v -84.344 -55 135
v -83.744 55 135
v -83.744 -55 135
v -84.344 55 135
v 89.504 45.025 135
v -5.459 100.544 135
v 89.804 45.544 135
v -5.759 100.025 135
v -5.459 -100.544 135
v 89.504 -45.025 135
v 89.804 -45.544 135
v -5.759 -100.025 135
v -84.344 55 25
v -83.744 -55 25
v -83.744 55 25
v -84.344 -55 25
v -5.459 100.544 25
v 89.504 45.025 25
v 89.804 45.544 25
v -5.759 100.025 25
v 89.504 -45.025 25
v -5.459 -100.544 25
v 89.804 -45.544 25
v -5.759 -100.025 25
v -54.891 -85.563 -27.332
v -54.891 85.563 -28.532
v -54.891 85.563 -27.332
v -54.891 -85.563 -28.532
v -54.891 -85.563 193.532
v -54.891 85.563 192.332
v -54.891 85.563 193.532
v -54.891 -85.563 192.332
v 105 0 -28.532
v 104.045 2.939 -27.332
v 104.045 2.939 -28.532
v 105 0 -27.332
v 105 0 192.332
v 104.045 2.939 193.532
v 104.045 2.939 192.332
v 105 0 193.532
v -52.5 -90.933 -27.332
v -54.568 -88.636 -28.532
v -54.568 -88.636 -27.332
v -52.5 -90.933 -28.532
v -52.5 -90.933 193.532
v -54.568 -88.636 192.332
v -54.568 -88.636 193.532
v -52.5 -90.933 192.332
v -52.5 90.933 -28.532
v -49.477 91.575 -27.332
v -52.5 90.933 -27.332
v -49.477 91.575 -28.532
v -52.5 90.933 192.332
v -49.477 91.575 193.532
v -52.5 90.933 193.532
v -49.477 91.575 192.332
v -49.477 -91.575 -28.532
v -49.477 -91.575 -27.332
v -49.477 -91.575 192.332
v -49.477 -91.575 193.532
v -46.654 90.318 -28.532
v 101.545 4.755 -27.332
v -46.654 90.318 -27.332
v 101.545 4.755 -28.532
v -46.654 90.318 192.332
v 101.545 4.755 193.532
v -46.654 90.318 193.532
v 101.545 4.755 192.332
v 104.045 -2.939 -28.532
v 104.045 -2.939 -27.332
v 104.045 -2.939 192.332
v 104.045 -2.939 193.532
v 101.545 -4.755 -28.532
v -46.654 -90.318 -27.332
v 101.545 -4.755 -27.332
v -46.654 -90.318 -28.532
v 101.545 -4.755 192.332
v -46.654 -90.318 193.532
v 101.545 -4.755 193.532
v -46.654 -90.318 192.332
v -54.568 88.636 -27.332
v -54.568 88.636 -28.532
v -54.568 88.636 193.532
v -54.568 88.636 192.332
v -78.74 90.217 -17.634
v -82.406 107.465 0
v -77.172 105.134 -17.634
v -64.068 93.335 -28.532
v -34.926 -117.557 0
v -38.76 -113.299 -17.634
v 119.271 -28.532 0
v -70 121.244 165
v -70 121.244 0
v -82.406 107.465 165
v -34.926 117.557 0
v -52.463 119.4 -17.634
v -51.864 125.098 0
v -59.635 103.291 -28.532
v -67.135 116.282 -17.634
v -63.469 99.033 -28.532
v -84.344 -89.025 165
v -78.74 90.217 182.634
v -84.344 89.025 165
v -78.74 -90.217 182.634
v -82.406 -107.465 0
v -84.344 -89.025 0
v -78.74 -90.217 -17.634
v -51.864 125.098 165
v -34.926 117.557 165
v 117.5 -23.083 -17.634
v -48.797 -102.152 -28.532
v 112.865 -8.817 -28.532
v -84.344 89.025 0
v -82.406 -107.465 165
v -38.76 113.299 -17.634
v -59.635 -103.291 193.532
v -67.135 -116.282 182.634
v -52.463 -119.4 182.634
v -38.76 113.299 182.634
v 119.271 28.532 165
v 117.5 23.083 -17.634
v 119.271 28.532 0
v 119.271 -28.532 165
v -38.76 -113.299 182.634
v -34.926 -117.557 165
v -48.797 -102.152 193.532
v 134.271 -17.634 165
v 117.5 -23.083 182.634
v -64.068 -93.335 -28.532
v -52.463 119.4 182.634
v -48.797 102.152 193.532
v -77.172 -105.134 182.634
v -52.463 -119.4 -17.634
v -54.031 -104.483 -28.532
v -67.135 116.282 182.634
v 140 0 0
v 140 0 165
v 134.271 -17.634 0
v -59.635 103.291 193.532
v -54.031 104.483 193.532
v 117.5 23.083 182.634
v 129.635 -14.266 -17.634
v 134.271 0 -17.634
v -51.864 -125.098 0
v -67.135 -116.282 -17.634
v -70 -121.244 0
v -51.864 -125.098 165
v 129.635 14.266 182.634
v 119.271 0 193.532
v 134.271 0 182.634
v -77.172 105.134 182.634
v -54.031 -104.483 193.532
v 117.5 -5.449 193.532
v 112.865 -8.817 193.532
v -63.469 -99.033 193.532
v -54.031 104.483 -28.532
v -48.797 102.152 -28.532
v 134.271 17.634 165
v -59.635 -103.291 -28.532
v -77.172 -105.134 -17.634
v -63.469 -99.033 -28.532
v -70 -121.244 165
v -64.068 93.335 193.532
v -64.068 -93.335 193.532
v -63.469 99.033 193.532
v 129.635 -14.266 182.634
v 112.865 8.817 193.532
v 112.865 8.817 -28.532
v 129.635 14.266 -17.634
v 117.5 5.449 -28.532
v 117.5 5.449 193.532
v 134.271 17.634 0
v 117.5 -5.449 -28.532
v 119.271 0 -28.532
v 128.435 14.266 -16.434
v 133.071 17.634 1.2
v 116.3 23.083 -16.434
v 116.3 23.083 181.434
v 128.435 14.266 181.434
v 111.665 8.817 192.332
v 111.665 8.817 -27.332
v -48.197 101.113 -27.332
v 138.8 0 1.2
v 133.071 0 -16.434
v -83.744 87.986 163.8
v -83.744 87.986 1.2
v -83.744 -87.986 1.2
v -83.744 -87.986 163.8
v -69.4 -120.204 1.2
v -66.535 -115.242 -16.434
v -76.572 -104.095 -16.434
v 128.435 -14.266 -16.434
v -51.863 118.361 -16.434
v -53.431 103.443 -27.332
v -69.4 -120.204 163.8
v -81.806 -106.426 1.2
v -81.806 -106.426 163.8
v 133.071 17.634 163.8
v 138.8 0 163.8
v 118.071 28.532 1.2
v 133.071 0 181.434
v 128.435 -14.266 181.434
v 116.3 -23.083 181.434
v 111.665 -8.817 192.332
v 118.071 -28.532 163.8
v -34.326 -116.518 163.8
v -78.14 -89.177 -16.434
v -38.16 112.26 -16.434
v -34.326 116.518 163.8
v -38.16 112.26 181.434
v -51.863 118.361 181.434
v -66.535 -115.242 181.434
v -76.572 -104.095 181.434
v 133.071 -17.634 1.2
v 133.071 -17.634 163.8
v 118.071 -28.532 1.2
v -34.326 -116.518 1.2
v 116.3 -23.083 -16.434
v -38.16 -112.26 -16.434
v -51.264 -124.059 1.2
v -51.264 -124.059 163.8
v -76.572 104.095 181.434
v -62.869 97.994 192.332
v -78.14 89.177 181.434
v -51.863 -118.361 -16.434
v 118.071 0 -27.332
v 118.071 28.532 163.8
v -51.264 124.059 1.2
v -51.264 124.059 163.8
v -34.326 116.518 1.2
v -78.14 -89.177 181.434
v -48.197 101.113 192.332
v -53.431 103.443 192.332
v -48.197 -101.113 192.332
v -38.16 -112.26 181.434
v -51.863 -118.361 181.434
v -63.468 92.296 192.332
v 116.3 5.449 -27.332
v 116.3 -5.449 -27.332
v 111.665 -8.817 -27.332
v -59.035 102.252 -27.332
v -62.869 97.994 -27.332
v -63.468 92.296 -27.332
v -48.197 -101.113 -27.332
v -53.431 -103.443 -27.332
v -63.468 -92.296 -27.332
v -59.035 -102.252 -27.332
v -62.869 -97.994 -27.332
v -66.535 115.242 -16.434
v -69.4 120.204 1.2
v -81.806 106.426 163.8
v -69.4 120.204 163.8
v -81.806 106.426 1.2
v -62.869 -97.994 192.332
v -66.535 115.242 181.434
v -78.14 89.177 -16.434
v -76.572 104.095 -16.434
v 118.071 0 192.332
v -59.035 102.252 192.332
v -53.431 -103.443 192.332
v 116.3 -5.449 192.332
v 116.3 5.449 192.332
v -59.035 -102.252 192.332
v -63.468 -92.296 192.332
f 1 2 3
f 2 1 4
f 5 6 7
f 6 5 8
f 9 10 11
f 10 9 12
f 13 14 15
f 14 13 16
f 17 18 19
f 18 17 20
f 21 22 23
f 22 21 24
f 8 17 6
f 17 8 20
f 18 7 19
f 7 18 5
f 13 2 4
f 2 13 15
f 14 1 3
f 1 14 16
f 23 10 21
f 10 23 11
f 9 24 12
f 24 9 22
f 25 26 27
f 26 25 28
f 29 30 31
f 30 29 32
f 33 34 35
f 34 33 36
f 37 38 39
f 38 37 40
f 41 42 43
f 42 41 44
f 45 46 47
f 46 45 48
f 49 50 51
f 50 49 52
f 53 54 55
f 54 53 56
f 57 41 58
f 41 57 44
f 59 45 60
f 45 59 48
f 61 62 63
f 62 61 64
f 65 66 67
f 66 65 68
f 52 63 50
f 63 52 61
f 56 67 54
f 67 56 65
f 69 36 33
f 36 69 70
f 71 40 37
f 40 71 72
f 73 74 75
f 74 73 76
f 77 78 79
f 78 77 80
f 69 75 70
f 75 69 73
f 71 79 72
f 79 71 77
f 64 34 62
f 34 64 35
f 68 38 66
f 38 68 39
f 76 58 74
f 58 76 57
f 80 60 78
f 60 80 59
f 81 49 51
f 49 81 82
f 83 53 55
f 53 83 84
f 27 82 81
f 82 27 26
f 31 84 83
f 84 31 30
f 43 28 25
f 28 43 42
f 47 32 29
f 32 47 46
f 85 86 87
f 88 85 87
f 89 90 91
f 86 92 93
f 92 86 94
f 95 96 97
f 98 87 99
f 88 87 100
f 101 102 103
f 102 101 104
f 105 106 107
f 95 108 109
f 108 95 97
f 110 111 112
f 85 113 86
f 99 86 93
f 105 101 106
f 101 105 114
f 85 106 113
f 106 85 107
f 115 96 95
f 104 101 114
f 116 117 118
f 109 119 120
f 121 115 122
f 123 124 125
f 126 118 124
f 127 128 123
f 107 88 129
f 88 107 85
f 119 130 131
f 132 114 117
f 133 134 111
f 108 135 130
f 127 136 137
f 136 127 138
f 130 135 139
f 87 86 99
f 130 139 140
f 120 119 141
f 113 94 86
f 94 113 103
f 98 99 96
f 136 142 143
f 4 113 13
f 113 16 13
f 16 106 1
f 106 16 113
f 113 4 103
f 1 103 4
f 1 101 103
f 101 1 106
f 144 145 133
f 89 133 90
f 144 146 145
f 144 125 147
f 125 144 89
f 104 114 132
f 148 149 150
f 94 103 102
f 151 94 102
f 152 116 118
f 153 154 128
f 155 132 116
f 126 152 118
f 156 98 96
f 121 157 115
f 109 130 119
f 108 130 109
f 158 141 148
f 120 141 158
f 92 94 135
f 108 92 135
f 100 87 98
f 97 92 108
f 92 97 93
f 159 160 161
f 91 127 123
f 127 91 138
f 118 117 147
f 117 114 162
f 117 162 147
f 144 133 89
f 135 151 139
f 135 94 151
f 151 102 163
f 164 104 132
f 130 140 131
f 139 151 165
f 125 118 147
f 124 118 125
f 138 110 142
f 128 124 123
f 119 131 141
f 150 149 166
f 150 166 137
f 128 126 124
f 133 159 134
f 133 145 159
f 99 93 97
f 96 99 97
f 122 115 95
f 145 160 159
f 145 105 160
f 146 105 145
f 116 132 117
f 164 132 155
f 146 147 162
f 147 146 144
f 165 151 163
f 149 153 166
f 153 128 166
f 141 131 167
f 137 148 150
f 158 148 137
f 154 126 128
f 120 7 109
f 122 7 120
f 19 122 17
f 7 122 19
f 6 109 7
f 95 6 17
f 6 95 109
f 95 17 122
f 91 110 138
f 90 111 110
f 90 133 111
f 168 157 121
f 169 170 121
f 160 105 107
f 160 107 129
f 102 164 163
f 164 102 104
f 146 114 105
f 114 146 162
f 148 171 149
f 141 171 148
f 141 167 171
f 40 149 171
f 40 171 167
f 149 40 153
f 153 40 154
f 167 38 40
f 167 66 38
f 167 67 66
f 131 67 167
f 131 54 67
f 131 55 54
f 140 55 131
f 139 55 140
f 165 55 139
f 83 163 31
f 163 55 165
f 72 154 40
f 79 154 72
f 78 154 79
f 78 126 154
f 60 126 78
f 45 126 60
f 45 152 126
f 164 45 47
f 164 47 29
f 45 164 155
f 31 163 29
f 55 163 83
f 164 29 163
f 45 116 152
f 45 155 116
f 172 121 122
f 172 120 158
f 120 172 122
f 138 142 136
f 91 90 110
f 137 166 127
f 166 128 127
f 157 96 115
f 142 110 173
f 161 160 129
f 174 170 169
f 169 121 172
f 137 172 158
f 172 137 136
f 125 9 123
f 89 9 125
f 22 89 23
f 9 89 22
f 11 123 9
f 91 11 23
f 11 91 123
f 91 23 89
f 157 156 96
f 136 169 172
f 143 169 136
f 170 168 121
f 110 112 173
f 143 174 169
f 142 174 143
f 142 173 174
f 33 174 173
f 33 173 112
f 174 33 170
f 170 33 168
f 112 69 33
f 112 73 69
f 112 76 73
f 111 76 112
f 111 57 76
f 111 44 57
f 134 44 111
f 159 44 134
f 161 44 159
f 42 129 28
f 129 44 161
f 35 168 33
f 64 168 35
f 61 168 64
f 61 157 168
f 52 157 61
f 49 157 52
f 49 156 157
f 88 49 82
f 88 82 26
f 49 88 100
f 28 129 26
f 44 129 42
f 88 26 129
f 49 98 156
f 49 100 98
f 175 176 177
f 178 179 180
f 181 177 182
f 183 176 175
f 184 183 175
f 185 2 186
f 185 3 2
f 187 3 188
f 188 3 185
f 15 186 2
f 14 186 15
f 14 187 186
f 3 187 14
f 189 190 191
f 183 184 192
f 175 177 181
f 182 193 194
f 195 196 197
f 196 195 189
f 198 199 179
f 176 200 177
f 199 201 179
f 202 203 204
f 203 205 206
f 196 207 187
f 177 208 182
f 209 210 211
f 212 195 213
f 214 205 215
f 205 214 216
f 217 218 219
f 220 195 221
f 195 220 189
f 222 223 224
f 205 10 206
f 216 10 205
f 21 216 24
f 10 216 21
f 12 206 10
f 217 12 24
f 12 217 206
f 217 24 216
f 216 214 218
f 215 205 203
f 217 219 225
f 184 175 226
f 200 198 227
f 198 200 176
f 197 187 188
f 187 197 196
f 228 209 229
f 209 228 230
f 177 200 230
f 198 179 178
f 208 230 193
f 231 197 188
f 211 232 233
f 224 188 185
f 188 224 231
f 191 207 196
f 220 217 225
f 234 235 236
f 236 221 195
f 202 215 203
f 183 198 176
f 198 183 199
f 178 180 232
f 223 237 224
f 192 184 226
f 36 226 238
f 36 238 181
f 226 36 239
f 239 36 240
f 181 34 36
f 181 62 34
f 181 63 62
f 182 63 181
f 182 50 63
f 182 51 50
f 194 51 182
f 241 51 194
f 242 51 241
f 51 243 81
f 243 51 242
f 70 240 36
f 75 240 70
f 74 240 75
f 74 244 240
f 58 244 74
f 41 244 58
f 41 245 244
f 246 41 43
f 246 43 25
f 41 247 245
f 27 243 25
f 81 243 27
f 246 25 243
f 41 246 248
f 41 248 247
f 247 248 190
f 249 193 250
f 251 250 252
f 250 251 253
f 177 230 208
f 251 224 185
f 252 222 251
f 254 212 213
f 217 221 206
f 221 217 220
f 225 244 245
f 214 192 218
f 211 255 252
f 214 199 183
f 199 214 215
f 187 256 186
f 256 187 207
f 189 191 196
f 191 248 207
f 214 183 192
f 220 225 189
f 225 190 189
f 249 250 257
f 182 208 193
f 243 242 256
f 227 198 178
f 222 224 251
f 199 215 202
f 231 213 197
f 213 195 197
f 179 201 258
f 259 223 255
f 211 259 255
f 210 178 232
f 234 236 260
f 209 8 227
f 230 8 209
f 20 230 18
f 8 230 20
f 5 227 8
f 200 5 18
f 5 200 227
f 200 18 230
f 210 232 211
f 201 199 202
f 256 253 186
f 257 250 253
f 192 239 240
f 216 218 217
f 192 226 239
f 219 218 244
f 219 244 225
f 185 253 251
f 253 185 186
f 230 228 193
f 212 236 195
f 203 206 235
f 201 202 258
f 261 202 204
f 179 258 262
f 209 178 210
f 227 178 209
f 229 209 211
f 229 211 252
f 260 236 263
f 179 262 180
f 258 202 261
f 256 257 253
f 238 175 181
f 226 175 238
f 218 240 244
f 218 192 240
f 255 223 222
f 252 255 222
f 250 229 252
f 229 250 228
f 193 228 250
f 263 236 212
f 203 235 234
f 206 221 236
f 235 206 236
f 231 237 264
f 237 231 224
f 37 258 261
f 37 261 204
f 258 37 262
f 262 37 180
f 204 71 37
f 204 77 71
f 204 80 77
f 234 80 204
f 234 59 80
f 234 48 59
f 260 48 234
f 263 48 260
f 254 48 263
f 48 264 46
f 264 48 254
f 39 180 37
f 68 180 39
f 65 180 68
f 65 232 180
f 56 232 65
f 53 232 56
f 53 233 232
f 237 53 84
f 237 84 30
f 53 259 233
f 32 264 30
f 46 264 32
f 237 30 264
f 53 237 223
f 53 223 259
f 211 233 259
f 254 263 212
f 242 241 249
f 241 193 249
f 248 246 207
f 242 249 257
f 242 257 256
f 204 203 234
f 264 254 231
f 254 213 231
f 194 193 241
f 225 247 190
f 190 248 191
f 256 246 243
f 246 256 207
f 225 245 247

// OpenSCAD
w = 165;
h = 110;
t = 1.2;
$fn = 10;

difference() {
    middle(h, 0);
    middle(h-t, t);
    lengthwise_cutout();
}

module lengthwise_cutout() {
    o = 50;
    s = h / 1.1;
    hull() {
        translate([0, 0, -o]) radial_multiply(3, s) cylinder(1, r=5);
        translate([0, 0, w+o]) radial_multiply(3, s) cylinder(1, r=5);
    }
    
    
    translate([0, 0, 80]) rotate([0, 0, 60]) radial_multiply(3, 30) cube(h, true);
}


module middle(distance_apart, t) {
    hull() {
        translate([0, 0, t]) radial_multiply(3, distance_apart) sphere(30);
        translate([0, 0, w-t]) radial_multiply(3, distance_apart) sphere(30);
    }   
}

module radial_multiply(num, distance_apart) {
    p = distance_apart;    
    step =  360 / num;
    
    for (i = [0 : step : 360 ]) {
        translate([p, 0]) children(0);
        rotate([0, 0, i]) translate([p, 0]) children();
        rotate([0, 0, i]) translate([p, 0]) children();
    }
}
